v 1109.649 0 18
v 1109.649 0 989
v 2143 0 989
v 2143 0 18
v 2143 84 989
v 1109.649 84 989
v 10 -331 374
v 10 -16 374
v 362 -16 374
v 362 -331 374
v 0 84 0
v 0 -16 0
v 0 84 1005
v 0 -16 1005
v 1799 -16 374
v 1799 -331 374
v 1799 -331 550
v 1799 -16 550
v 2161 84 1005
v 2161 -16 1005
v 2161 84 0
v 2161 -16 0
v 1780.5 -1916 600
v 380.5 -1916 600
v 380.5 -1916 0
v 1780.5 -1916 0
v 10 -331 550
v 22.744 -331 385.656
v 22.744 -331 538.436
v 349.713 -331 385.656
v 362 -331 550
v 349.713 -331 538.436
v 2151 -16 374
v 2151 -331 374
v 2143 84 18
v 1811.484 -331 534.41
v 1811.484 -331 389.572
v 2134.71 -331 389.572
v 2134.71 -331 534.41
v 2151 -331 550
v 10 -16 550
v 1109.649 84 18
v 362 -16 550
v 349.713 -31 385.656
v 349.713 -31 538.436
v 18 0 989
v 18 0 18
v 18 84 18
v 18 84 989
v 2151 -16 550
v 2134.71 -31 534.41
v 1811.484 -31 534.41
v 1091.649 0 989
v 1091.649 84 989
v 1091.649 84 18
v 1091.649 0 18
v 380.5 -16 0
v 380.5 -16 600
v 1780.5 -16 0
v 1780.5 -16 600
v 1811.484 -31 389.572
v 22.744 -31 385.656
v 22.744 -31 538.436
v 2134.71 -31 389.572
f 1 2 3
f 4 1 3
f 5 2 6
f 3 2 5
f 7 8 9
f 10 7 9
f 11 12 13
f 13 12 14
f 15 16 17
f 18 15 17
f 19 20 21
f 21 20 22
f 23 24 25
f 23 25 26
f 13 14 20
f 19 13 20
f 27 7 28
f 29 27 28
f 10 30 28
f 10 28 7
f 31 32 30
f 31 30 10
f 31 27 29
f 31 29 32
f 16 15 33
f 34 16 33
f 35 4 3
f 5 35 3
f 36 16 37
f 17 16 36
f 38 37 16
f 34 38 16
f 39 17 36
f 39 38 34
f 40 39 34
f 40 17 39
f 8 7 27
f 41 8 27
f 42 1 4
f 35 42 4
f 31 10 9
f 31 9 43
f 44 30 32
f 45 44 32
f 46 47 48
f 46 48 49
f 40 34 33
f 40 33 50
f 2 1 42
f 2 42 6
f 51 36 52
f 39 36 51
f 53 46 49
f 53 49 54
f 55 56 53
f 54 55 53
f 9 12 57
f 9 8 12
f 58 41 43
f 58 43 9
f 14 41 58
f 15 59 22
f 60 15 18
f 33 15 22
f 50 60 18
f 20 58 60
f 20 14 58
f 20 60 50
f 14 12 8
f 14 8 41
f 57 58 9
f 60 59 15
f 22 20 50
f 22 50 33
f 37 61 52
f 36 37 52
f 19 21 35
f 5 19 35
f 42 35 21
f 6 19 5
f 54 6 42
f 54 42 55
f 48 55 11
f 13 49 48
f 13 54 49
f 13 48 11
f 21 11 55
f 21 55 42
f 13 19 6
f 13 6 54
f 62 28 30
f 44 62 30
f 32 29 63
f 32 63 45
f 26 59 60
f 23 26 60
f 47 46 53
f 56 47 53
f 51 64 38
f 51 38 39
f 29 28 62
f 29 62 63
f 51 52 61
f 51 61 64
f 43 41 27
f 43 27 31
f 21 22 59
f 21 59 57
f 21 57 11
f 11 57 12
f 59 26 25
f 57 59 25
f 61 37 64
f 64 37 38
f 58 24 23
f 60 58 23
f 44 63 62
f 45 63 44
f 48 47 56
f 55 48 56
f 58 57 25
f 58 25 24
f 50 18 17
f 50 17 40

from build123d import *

# Parameters (mm, degrees)
F0_W      = 2161
F0_H      = 989
F1_DEPTH  = 16
F2_W      = 1400
F2_H      = 600
F3_DEPTH  = 1900
F4_W      = 352
F4_H      = 176
F5_DEPTH  = 315
F6_W      = 2161
F6_H      = 16
F7_DEPTH  = 100
F8_W      = 18
F8_H      = 971
F9_DEPTH  = 84
F11_W     = 326.9687574357
F11_H     = 152.7800559998
F12_DEPTH = 300
F13_W     = 323.2262134552
F13_H     = 144.838064909
F14_DEPTH = 300


# Not quite as in the source:
# - a feature names something its author has since deleted; it is built from what else it names


with BuildPart() as f1:
    # F0 (on Front) → F1 (new body)
    with BuildSketch(Plane.XZ):
        with Locations((1080.5, 494.5)):
            Rectangle(F0_W, F0_H)
    extrude(amount=F1_DEPTH)

    # F2 (on face) → F3 (join)
    with BuildSketch(Plane.XZ.offset(16)):
        with Locations((1080.5, 300)):
            Rectangle(F2_W, F2_H)
    extrude(amount=F3_DEPTH)

    # F4 (on face) → F5 (join)
    with BuildSketch(Plane.XZ.offset(16)):
        with Locations((186, 462)):
            Rectangle(F4_W, F4_H)
        with Locations((1975, 462)):
            Rectangle(F4_W, F4_H)
    extrude(amount=F5_DEPTH)

    # F6 (on face) → F7 (join)
    with BuildSketch(Plane.XZ.offset(16)):
        with Locations((1080.5, 997)):
            Rectangle(F6_W, F6_H)
    extrude(amount=-F7_DEPTH)

    # F8 (on face) → F9 (join)
    with BuildSketch(Plane(origin=(0, 0, 0), x_dir=(-1, 0, 0), z_dir=(0, 1, 0))):
        Polygon((-2161, 18), (-2161, 0), (0, 0), (0, 18), (-18, 18), (-1091.649181366, 18), (-1109.649181366, 18), (-1478.5152740479, 18), (-1496.5152740479, 18), (-2143, 18), align=None)
        with Locations((-2152, 503.5)):
            Rectangle(F8_W, F8_H)
        with Locations((-9, 503.5)):
            Rectangle(F8_W, F8_H)
        with Locations((-1100.649181366, 503.5)):
            Rectangle(F8_W, F8_H)
    extrude(amount=F9_DEPTH)

    # F11 (on face) → F12 (cut)
    with BuildSketch(Plane.XZ.offset(331)):
        with Locations((186.2288573757, 462.0463848114)):
            Rectangle(F11_W, F11_H)
    extrude(amount=-F12_DEPTH, mode=Mode.SUBTRACT)

    # F13 (on face) → F14 (cut)
    with BuildSketch(Plane.XZ.offset(331)):
        with Locations((1973.0969667435, 461.9913846254)):
            Rectangle(F13_W, F13_H)
    extrude(amount=-F14_DEPTH, mode=Mode.SUBTRACT)


solid = f1.part
